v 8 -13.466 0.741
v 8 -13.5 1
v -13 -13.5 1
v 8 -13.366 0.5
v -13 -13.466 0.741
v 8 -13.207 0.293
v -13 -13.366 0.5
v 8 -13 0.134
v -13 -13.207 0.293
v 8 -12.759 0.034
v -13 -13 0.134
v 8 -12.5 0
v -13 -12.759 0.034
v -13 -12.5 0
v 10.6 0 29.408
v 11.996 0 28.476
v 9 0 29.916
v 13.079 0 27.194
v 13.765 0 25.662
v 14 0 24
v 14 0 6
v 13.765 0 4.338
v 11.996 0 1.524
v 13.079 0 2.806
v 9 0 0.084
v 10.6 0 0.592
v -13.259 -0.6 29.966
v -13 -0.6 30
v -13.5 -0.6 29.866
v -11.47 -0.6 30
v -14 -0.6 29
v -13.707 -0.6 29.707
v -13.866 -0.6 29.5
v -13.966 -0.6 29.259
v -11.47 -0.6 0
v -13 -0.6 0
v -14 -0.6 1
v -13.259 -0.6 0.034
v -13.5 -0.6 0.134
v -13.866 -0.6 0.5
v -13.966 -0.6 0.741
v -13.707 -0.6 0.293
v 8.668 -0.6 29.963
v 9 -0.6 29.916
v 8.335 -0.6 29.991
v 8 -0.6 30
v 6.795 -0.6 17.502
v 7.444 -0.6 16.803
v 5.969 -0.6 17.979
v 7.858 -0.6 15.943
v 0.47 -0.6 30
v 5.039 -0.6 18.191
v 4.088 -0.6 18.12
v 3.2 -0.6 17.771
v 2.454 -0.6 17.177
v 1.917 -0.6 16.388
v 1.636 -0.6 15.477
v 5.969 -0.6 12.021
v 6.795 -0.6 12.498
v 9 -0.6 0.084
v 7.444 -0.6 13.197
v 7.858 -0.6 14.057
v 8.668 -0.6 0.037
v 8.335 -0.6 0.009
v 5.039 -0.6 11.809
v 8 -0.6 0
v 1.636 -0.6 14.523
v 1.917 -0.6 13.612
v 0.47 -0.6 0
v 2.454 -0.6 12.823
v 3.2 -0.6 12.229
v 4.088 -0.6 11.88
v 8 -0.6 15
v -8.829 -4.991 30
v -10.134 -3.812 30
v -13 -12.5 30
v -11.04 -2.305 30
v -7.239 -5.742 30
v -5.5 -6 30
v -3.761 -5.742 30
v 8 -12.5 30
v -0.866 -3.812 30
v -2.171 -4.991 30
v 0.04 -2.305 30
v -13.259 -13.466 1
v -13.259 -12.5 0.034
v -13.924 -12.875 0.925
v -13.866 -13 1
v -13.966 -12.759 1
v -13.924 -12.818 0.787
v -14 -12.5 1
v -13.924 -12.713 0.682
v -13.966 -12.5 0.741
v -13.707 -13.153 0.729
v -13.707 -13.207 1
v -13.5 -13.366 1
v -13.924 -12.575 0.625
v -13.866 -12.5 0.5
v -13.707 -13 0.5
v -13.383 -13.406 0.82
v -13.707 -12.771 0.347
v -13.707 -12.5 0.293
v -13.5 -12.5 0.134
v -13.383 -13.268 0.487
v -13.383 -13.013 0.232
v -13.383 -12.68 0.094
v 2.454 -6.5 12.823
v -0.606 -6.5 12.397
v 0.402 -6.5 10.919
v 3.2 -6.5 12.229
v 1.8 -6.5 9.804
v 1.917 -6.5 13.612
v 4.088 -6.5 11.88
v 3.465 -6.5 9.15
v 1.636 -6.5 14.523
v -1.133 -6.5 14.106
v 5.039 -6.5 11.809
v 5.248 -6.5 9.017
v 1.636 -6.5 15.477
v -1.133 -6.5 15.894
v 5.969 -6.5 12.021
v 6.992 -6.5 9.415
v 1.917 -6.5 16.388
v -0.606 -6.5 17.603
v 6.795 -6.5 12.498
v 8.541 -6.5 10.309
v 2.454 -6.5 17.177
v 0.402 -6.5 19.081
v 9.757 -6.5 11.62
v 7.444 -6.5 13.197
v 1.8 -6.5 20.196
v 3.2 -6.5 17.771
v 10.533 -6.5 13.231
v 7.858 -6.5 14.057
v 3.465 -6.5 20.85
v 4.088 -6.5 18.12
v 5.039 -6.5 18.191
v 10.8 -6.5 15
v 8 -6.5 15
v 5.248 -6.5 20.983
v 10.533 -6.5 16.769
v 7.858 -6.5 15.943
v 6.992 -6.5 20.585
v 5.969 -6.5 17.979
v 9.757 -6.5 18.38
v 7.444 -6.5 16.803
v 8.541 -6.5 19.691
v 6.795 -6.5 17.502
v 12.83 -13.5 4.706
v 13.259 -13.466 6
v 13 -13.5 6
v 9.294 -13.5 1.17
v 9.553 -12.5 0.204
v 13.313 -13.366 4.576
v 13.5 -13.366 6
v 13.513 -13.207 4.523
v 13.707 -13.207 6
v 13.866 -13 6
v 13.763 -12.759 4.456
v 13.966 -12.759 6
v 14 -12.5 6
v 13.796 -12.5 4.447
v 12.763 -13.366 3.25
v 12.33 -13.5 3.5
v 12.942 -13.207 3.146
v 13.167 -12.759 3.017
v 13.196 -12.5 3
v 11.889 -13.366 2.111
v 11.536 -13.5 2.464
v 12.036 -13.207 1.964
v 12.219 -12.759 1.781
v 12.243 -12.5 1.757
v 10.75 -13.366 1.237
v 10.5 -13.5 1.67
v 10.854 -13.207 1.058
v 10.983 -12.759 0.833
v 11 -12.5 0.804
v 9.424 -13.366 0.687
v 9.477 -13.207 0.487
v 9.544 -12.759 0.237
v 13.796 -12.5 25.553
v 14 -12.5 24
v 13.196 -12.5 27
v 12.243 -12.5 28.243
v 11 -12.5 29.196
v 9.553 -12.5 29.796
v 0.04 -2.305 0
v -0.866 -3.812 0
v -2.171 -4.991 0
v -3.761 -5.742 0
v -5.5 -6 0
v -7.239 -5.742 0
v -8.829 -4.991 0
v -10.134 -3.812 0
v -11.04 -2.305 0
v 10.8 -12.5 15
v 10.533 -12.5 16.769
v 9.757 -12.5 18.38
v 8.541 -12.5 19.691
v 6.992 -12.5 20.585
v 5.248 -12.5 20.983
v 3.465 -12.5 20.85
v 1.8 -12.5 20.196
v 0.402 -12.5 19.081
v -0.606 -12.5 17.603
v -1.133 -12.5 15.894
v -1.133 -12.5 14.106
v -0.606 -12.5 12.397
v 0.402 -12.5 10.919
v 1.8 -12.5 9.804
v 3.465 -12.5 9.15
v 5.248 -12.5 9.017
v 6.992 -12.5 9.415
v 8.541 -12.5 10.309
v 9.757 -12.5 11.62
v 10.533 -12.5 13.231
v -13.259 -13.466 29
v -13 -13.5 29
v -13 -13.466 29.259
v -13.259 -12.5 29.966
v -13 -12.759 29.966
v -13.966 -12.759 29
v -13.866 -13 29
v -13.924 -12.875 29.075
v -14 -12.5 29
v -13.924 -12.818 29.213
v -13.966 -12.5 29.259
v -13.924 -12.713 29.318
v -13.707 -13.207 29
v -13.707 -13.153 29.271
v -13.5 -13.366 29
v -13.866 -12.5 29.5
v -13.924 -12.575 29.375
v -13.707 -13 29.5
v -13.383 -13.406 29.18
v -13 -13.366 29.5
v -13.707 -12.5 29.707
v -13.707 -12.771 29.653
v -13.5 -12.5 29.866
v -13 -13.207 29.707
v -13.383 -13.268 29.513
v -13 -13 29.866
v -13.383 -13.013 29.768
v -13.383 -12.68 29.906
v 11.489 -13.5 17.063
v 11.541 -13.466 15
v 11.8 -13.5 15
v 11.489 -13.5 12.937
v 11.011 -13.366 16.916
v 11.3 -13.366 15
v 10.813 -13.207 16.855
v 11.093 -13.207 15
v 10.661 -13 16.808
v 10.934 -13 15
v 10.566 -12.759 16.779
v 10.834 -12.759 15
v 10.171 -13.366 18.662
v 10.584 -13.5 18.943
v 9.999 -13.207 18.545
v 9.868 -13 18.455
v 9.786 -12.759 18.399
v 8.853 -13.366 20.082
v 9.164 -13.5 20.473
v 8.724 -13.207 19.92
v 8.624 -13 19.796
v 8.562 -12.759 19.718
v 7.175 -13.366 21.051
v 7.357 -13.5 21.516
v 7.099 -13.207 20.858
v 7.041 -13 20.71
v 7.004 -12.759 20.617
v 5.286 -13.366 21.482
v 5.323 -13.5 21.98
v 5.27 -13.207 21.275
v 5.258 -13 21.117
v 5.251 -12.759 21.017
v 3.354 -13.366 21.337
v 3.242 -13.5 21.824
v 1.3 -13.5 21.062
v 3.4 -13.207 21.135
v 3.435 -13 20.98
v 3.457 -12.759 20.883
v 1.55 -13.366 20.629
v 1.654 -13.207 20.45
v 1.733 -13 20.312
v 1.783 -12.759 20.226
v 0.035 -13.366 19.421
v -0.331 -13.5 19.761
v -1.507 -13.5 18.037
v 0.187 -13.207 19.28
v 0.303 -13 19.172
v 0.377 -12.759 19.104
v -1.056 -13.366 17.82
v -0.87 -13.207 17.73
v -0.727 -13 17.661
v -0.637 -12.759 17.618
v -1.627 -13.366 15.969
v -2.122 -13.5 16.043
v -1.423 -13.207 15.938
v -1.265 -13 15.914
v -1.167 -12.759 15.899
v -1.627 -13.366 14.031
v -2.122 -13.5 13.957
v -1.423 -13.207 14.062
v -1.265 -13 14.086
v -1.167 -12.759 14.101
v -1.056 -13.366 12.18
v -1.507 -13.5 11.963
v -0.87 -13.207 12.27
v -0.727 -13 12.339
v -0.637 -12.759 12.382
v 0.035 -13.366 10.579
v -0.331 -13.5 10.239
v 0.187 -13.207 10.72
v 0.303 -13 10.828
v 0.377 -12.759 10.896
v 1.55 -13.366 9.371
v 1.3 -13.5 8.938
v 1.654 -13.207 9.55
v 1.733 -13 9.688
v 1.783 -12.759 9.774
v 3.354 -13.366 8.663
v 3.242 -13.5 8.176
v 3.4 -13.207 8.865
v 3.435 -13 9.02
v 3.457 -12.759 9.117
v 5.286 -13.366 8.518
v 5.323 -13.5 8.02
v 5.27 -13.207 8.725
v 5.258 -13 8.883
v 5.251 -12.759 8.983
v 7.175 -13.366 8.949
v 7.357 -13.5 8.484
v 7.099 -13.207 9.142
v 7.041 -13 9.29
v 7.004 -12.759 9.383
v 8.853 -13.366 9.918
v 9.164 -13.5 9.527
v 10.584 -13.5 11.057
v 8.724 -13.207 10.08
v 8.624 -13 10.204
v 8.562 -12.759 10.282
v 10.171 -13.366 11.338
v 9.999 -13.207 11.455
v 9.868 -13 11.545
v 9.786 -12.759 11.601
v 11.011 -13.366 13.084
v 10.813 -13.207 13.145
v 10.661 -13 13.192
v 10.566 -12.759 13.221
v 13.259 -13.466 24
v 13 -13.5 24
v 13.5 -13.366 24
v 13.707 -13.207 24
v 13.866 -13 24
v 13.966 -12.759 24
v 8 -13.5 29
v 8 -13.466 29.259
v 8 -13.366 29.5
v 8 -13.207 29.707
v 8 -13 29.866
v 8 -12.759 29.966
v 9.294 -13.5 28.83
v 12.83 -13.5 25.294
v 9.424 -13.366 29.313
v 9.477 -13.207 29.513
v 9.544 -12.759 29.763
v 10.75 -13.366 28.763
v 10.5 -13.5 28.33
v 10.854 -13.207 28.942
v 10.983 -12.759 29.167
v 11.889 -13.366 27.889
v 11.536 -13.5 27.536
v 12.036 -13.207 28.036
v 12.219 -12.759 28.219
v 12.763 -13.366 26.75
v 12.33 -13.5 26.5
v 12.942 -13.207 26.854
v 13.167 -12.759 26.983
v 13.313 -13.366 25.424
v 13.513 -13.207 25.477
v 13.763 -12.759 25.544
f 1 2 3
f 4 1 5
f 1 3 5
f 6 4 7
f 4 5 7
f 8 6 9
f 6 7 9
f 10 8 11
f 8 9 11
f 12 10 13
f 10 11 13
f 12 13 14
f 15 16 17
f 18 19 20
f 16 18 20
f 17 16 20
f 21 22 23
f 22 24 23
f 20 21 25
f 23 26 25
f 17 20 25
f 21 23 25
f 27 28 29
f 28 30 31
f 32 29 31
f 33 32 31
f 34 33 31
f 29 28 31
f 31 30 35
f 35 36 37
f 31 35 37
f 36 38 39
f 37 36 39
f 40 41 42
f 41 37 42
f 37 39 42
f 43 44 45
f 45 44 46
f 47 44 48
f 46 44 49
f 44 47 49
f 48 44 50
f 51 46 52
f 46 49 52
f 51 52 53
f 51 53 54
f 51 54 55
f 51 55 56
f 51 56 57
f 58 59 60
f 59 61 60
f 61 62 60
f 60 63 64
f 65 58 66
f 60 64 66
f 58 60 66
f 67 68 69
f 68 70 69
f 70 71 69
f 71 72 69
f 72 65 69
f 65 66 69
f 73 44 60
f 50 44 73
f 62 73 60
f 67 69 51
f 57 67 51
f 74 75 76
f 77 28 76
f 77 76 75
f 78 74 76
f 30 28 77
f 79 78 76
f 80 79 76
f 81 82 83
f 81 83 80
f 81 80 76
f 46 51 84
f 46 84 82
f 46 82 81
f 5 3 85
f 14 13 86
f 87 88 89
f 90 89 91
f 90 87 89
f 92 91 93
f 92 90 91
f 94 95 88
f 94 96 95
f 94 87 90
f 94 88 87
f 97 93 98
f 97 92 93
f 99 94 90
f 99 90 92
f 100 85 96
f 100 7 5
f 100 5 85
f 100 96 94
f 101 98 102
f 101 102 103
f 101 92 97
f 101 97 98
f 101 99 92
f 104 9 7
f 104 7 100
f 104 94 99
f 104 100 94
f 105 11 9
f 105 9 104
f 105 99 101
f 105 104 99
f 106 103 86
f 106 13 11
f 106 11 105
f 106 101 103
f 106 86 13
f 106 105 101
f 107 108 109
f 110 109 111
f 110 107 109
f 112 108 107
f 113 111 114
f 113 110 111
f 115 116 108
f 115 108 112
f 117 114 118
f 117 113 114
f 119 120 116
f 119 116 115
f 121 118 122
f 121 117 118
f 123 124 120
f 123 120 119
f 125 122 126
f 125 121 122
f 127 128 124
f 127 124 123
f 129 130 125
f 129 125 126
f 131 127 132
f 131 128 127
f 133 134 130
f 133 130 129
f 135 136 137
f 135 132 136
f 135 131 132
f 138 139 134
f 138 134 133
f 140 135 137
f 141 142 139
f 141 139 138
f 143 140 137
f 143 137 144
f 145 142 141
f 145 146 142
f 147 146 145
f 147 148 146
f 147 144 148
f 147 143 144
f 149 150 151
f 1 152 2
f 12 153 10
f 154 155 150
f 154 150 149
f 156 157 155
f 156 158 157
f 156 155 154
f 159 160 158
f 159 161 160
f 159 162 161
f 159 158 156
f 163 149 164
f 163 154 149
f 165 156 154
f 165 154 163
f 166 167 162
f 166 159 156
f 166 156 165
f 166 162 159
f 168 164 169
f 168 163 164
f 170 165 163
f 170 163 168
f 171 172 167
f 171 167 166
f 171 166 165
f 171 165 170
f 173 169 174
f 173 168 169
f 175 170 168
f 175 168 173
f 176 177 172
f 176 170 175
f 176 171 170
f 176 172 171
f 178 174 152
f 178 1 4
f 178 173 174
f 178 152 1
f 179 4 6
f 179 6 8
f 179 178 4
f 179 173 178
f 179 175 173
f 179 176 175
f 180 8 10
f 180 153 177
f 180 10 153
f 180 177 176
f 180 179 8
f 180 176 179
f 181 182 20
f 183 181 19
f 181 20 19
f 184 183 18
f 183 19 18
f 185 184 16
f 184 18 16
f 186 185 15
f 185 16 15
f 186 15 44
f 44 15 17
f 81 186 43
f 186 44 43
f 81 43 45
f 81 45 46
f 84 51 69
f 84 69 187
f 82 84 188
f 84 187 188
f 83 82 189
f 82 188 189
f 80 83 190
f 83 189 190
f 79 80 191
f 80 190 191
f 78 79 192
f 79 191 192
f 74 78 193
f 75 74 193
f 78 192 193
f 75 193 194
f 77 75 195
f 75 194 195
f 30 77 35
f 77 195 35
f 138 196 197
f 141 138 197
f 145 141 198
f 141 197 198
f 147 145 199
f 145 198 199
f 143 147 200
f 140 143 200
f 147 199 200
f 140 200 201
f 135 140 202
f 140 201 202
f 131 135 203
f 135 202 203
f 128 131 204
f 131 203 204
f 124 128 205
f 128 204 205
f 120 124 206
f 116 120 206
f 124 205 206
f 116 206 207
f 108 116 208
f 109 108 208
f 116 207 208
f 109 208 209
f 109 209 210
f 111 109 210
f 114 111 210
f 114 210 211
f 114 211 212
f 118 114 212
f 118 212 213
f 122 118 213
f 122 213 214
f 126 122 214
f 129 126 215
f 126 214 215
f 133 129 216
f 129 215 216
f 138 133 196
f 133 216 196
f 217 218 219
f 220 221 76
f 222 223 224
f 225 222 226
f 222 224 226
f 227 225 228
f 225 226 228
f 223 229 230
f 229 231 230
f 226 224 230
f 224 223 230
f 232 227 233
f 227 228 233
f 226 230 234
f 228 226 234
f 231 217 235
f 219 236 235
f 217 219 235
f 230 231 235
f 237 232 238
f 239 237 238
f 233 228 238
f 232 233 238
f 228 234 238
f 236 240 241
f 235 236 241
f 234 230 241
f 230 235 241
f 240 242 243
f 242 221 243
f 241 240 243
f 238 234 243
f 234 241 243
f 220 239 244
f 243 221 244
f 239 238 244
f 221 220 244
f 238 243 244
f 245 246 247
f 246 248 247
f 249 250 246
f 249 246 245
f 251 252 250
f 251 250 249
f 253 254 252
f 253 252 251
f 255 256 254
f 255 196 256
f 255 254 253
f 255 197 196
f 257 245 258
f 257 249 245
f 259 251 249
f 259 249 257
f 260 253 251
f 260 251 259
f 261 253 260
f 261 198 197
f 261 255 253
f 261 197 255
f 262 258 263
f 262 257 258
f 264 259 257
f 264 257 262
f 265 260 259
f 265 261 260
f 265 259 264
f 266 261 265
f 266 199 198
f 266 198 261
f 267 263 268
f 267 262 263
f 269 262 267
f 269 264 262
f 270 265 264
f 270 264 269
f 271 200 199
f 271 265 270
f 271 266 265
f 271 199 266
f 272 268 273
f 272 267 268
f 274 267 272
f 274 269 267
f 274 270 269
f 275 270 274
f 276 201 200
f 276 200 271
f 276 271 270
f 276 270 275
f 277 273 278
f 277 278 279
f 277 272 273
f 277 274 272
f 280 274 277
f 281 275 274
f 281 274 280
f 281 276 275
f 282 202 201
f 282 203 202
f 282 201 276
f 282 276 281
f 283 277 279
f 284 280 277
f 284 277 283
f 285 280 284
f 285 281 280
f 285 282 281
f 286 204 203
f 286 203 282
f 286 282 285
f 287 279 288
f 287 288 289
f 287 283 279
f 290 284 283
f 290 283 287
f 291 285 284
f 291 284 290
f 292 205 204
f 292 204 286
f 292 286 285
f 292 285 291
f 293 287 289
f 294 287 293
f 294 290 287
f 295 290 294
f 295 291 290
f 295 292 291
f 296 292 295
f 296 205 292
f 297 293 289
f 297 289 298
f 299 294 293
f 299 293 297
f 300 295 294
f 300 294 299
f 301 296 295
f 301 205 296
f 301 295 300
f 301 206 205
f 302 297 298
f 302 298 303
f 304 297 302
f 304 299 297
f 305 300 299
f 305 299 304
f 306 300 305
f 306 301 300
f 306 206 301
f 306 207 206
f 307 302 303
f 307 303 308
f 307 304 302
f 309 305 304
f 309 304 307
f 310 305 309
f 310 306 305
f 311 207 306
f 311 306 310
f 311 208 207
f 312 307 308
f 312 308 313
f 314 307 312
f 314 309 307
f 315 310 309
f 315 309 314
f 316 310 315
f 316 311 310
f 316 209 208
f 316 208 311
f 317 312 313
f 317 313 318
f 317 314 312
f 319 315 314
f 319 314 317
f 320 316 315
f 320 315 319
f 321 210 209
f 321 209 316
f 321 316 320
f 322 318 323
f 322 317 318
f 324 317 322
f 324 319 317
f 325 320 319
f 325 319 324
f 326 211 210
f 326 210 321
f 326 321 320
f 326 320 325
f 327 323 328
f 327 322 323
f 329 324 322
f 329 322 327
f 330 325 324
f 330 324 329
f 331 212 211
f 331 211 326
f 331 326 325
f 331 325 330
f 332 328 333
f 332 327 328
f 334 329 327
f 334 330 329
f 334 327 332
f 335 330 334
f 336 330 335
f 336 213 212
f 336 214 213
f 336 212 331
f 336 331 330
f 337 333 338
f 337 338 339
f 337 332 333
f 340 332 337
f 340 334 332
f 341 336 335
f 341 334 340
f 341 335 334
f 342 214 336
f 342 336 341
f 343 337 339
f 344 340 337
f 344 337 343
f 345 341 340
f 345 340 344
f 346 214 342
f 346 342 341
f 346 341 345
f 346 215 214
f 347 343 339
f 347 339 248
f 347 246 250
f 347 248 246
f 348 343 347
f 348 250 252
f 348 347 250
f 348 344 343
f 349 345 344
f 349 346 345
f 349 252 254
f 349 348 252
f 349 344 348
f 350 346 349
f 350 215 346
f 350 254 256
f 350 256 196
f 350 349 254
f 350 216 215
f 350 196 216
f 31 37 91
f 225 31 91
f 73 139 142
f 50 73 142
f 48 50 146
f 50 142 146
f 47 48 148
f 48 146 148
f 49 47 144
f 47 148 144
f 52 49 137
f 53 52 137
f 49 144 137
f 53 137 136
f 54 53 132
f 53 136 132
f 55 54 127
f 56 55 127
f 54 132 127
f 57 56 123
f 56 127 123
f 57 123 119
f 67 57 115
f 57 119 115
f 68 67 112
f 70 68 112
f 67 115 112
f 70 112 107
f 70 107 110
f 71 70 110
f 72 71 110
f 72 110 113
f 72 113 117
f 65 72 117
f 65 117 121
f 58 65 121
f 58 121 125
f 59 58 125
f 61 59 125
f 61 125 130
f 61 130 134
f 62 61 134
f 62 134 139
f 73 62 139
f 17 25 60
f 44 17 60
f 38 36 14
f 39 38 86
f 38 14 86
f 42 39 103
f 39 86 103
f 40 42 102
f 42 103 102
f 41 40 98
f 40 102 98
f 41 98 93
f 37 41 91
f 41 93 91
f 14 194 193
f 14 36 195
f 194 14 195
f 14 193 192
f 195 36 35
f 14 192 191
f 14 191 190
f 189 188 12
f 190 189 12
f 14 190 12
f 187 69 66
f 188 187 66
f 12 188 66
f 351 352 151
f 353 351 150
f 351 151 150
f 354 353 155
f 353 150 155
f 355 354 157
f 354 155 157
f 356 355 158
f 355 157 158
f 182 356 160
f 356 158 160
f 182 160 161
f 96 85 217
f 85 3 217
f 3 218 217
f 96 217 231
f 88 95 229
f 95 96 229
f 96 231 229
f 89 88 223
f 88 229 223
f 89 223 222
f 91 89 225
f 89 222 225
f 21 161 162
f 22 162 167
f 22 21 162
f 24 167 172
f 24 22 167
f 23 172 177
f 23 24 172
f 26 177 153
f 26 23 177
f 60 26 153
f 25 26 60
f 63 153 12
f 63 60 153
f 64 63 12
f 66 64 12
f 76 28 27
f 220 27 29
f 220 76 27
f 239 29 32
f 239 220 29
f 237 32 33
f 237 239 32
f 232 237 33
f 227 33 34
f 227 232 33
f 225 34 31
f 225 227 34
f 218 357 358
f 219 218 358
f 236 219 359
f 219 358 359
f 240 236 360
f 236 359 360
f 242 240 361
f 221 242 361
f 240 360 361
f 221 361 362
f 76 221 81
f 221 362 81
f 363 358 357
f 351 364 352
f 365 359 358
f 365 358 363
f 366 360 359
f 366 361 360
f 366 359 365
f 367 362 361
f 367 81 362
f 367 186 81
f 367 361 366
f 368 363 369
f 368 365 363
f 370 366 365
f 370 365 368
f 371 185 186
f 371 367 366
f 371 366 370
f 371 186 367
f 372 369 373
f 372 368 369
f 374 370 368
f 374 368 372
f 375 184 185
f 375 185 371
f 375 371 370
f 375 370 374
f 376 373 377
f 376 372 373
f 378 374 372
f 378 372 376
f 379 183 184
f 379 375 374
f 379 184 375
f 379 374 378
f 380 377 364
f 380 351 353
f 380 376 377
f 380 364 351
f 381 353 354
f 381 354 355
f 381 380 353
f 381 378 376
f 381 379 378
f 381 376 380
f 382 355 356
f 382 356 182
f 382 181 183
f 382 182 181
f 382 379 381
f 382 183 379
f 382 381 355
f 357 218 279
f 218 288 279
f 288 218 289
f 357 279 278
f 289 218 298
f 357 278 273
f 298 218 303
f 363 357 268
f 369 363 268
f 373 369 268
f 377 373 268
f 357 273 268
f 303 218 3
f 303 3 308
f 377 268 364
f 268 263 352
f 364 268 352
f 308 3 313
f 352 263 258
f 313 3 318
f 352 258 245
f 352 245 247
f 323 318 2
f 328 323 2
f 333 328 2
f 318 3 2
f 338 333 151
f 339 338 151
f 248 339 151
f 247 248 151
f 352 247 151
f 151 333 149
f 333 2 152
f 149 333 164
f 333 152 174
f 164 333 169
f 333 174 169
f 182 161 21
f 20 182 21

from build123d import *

# Parameters (mm, degrees)
F1_DEPTH = 30
F2_R     = 6
F2_R_2   = 3.2
F3_DEPTH = 7
F4_DEPTH = 25
F5_R     = 6
F6_R     = 1


with BuildPart() as f1:
    # F0 (on Top) → F1 (new body)
    with BuildSketch(Plane.XY):
        with BuildLine():
            Line((14, 0), (9, 0))
            Line((9, 0), (9, -0.6))
            Line((9, -0.6), (0.4699246226, -0.6))
            ThreePointArc((0.4699246226, -0.6), (-5.5, -6), (-11.4699246226, -0.6))
            Line((-11.4699246226, -0.6), (-14, -0.6))
            Line((-14, -0.6), (-14, -13.5))
            Line((-14, -13.5), (14, -13.5))
            Line((14, -13.5), (14, 0))
        make_face()
    extrude(amount=F1_DEPTH)

    # F2 (on face) → F3 (cut)
    with BuildSketch(Plane.XZ.offset(13.5)):
        with Locations((4.8, 15)):
            Circle(F2_R)
        with Locations((4.8, 15)):
            Circle(F2_R_2, mode=Mode.SUBTRACT)
    extrude(amount=-F3_DEPTH, mode=Mode.SUBTRACT)

    # F4 (cut): a face of the model
    f4_faces = [f1.faces().sort_by_distance(p)[0] for p in [
        (4.8, -13.5, 15),
    ]]
    extrude(f4_faces, amount=-F4_DEPTH, mode=Mode.SUBTRACT)

    # F5
    f5_edges = [f1.edges().sort_by_distance(p)[0] for p in [
        (14, -6.75, 0),
        (14, -6.75, 30),
    ]]
    fillet(f5_edges, radius=F5_R)

    # F6
    f6_edges = [f1.edges().sort_by_distance(p)[0] for p in [
        (-3, -13.5, 30),
        (-14, -13.5, 15),
        (-14, -7.05, 30),
        (-14, -7.05, 0),
        (-1.2, -13.5, 15),
    ]]
    fillet(f6_edges, radius=F6_R)


solid = f1.part
